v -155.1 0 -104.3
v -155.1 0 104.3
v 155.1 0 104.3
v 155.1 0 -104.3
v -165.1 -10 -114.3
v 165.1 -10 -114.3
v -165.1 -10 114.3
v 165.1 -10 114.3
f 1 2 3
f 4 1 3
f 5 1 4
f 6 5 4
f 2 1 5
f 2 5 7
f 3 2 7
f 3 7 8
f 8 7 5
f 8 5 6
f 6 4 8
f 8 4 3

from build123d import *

# Parameters (mm, degrees)
F1_W     = 330.2
F1_H     = 228.6
F2_DEPTH = 10
F3_SIZE  = 9.99999


# Not quite as in the source:
# - a fillet or chamfer is up to 0.001 mm smaller than in the source, because OpenCascade refuses the exact size


with BuildPart() as f2:
    # F1 (on face) → F2 (new body)
    with BuildSketch(Plane.XZ):
        Rectangle(F1_W, F1_H)
    extrude(amount=F2_DEPTH)

    # F3 (size 10 in the source; OpenCascade refuses exactly that, so slightly less here)
    f3_edges = [f2.edges().sort_by_distance(p)[0] for p in [
        (0, 0, 114.3),
        (165.1, 0, 0),
        (-165.1, 0, 0),
        (0, 0, -114.3),
    ]]
    chamfer(f3_edges, length=F3_SIZE)


solid = f2.part
